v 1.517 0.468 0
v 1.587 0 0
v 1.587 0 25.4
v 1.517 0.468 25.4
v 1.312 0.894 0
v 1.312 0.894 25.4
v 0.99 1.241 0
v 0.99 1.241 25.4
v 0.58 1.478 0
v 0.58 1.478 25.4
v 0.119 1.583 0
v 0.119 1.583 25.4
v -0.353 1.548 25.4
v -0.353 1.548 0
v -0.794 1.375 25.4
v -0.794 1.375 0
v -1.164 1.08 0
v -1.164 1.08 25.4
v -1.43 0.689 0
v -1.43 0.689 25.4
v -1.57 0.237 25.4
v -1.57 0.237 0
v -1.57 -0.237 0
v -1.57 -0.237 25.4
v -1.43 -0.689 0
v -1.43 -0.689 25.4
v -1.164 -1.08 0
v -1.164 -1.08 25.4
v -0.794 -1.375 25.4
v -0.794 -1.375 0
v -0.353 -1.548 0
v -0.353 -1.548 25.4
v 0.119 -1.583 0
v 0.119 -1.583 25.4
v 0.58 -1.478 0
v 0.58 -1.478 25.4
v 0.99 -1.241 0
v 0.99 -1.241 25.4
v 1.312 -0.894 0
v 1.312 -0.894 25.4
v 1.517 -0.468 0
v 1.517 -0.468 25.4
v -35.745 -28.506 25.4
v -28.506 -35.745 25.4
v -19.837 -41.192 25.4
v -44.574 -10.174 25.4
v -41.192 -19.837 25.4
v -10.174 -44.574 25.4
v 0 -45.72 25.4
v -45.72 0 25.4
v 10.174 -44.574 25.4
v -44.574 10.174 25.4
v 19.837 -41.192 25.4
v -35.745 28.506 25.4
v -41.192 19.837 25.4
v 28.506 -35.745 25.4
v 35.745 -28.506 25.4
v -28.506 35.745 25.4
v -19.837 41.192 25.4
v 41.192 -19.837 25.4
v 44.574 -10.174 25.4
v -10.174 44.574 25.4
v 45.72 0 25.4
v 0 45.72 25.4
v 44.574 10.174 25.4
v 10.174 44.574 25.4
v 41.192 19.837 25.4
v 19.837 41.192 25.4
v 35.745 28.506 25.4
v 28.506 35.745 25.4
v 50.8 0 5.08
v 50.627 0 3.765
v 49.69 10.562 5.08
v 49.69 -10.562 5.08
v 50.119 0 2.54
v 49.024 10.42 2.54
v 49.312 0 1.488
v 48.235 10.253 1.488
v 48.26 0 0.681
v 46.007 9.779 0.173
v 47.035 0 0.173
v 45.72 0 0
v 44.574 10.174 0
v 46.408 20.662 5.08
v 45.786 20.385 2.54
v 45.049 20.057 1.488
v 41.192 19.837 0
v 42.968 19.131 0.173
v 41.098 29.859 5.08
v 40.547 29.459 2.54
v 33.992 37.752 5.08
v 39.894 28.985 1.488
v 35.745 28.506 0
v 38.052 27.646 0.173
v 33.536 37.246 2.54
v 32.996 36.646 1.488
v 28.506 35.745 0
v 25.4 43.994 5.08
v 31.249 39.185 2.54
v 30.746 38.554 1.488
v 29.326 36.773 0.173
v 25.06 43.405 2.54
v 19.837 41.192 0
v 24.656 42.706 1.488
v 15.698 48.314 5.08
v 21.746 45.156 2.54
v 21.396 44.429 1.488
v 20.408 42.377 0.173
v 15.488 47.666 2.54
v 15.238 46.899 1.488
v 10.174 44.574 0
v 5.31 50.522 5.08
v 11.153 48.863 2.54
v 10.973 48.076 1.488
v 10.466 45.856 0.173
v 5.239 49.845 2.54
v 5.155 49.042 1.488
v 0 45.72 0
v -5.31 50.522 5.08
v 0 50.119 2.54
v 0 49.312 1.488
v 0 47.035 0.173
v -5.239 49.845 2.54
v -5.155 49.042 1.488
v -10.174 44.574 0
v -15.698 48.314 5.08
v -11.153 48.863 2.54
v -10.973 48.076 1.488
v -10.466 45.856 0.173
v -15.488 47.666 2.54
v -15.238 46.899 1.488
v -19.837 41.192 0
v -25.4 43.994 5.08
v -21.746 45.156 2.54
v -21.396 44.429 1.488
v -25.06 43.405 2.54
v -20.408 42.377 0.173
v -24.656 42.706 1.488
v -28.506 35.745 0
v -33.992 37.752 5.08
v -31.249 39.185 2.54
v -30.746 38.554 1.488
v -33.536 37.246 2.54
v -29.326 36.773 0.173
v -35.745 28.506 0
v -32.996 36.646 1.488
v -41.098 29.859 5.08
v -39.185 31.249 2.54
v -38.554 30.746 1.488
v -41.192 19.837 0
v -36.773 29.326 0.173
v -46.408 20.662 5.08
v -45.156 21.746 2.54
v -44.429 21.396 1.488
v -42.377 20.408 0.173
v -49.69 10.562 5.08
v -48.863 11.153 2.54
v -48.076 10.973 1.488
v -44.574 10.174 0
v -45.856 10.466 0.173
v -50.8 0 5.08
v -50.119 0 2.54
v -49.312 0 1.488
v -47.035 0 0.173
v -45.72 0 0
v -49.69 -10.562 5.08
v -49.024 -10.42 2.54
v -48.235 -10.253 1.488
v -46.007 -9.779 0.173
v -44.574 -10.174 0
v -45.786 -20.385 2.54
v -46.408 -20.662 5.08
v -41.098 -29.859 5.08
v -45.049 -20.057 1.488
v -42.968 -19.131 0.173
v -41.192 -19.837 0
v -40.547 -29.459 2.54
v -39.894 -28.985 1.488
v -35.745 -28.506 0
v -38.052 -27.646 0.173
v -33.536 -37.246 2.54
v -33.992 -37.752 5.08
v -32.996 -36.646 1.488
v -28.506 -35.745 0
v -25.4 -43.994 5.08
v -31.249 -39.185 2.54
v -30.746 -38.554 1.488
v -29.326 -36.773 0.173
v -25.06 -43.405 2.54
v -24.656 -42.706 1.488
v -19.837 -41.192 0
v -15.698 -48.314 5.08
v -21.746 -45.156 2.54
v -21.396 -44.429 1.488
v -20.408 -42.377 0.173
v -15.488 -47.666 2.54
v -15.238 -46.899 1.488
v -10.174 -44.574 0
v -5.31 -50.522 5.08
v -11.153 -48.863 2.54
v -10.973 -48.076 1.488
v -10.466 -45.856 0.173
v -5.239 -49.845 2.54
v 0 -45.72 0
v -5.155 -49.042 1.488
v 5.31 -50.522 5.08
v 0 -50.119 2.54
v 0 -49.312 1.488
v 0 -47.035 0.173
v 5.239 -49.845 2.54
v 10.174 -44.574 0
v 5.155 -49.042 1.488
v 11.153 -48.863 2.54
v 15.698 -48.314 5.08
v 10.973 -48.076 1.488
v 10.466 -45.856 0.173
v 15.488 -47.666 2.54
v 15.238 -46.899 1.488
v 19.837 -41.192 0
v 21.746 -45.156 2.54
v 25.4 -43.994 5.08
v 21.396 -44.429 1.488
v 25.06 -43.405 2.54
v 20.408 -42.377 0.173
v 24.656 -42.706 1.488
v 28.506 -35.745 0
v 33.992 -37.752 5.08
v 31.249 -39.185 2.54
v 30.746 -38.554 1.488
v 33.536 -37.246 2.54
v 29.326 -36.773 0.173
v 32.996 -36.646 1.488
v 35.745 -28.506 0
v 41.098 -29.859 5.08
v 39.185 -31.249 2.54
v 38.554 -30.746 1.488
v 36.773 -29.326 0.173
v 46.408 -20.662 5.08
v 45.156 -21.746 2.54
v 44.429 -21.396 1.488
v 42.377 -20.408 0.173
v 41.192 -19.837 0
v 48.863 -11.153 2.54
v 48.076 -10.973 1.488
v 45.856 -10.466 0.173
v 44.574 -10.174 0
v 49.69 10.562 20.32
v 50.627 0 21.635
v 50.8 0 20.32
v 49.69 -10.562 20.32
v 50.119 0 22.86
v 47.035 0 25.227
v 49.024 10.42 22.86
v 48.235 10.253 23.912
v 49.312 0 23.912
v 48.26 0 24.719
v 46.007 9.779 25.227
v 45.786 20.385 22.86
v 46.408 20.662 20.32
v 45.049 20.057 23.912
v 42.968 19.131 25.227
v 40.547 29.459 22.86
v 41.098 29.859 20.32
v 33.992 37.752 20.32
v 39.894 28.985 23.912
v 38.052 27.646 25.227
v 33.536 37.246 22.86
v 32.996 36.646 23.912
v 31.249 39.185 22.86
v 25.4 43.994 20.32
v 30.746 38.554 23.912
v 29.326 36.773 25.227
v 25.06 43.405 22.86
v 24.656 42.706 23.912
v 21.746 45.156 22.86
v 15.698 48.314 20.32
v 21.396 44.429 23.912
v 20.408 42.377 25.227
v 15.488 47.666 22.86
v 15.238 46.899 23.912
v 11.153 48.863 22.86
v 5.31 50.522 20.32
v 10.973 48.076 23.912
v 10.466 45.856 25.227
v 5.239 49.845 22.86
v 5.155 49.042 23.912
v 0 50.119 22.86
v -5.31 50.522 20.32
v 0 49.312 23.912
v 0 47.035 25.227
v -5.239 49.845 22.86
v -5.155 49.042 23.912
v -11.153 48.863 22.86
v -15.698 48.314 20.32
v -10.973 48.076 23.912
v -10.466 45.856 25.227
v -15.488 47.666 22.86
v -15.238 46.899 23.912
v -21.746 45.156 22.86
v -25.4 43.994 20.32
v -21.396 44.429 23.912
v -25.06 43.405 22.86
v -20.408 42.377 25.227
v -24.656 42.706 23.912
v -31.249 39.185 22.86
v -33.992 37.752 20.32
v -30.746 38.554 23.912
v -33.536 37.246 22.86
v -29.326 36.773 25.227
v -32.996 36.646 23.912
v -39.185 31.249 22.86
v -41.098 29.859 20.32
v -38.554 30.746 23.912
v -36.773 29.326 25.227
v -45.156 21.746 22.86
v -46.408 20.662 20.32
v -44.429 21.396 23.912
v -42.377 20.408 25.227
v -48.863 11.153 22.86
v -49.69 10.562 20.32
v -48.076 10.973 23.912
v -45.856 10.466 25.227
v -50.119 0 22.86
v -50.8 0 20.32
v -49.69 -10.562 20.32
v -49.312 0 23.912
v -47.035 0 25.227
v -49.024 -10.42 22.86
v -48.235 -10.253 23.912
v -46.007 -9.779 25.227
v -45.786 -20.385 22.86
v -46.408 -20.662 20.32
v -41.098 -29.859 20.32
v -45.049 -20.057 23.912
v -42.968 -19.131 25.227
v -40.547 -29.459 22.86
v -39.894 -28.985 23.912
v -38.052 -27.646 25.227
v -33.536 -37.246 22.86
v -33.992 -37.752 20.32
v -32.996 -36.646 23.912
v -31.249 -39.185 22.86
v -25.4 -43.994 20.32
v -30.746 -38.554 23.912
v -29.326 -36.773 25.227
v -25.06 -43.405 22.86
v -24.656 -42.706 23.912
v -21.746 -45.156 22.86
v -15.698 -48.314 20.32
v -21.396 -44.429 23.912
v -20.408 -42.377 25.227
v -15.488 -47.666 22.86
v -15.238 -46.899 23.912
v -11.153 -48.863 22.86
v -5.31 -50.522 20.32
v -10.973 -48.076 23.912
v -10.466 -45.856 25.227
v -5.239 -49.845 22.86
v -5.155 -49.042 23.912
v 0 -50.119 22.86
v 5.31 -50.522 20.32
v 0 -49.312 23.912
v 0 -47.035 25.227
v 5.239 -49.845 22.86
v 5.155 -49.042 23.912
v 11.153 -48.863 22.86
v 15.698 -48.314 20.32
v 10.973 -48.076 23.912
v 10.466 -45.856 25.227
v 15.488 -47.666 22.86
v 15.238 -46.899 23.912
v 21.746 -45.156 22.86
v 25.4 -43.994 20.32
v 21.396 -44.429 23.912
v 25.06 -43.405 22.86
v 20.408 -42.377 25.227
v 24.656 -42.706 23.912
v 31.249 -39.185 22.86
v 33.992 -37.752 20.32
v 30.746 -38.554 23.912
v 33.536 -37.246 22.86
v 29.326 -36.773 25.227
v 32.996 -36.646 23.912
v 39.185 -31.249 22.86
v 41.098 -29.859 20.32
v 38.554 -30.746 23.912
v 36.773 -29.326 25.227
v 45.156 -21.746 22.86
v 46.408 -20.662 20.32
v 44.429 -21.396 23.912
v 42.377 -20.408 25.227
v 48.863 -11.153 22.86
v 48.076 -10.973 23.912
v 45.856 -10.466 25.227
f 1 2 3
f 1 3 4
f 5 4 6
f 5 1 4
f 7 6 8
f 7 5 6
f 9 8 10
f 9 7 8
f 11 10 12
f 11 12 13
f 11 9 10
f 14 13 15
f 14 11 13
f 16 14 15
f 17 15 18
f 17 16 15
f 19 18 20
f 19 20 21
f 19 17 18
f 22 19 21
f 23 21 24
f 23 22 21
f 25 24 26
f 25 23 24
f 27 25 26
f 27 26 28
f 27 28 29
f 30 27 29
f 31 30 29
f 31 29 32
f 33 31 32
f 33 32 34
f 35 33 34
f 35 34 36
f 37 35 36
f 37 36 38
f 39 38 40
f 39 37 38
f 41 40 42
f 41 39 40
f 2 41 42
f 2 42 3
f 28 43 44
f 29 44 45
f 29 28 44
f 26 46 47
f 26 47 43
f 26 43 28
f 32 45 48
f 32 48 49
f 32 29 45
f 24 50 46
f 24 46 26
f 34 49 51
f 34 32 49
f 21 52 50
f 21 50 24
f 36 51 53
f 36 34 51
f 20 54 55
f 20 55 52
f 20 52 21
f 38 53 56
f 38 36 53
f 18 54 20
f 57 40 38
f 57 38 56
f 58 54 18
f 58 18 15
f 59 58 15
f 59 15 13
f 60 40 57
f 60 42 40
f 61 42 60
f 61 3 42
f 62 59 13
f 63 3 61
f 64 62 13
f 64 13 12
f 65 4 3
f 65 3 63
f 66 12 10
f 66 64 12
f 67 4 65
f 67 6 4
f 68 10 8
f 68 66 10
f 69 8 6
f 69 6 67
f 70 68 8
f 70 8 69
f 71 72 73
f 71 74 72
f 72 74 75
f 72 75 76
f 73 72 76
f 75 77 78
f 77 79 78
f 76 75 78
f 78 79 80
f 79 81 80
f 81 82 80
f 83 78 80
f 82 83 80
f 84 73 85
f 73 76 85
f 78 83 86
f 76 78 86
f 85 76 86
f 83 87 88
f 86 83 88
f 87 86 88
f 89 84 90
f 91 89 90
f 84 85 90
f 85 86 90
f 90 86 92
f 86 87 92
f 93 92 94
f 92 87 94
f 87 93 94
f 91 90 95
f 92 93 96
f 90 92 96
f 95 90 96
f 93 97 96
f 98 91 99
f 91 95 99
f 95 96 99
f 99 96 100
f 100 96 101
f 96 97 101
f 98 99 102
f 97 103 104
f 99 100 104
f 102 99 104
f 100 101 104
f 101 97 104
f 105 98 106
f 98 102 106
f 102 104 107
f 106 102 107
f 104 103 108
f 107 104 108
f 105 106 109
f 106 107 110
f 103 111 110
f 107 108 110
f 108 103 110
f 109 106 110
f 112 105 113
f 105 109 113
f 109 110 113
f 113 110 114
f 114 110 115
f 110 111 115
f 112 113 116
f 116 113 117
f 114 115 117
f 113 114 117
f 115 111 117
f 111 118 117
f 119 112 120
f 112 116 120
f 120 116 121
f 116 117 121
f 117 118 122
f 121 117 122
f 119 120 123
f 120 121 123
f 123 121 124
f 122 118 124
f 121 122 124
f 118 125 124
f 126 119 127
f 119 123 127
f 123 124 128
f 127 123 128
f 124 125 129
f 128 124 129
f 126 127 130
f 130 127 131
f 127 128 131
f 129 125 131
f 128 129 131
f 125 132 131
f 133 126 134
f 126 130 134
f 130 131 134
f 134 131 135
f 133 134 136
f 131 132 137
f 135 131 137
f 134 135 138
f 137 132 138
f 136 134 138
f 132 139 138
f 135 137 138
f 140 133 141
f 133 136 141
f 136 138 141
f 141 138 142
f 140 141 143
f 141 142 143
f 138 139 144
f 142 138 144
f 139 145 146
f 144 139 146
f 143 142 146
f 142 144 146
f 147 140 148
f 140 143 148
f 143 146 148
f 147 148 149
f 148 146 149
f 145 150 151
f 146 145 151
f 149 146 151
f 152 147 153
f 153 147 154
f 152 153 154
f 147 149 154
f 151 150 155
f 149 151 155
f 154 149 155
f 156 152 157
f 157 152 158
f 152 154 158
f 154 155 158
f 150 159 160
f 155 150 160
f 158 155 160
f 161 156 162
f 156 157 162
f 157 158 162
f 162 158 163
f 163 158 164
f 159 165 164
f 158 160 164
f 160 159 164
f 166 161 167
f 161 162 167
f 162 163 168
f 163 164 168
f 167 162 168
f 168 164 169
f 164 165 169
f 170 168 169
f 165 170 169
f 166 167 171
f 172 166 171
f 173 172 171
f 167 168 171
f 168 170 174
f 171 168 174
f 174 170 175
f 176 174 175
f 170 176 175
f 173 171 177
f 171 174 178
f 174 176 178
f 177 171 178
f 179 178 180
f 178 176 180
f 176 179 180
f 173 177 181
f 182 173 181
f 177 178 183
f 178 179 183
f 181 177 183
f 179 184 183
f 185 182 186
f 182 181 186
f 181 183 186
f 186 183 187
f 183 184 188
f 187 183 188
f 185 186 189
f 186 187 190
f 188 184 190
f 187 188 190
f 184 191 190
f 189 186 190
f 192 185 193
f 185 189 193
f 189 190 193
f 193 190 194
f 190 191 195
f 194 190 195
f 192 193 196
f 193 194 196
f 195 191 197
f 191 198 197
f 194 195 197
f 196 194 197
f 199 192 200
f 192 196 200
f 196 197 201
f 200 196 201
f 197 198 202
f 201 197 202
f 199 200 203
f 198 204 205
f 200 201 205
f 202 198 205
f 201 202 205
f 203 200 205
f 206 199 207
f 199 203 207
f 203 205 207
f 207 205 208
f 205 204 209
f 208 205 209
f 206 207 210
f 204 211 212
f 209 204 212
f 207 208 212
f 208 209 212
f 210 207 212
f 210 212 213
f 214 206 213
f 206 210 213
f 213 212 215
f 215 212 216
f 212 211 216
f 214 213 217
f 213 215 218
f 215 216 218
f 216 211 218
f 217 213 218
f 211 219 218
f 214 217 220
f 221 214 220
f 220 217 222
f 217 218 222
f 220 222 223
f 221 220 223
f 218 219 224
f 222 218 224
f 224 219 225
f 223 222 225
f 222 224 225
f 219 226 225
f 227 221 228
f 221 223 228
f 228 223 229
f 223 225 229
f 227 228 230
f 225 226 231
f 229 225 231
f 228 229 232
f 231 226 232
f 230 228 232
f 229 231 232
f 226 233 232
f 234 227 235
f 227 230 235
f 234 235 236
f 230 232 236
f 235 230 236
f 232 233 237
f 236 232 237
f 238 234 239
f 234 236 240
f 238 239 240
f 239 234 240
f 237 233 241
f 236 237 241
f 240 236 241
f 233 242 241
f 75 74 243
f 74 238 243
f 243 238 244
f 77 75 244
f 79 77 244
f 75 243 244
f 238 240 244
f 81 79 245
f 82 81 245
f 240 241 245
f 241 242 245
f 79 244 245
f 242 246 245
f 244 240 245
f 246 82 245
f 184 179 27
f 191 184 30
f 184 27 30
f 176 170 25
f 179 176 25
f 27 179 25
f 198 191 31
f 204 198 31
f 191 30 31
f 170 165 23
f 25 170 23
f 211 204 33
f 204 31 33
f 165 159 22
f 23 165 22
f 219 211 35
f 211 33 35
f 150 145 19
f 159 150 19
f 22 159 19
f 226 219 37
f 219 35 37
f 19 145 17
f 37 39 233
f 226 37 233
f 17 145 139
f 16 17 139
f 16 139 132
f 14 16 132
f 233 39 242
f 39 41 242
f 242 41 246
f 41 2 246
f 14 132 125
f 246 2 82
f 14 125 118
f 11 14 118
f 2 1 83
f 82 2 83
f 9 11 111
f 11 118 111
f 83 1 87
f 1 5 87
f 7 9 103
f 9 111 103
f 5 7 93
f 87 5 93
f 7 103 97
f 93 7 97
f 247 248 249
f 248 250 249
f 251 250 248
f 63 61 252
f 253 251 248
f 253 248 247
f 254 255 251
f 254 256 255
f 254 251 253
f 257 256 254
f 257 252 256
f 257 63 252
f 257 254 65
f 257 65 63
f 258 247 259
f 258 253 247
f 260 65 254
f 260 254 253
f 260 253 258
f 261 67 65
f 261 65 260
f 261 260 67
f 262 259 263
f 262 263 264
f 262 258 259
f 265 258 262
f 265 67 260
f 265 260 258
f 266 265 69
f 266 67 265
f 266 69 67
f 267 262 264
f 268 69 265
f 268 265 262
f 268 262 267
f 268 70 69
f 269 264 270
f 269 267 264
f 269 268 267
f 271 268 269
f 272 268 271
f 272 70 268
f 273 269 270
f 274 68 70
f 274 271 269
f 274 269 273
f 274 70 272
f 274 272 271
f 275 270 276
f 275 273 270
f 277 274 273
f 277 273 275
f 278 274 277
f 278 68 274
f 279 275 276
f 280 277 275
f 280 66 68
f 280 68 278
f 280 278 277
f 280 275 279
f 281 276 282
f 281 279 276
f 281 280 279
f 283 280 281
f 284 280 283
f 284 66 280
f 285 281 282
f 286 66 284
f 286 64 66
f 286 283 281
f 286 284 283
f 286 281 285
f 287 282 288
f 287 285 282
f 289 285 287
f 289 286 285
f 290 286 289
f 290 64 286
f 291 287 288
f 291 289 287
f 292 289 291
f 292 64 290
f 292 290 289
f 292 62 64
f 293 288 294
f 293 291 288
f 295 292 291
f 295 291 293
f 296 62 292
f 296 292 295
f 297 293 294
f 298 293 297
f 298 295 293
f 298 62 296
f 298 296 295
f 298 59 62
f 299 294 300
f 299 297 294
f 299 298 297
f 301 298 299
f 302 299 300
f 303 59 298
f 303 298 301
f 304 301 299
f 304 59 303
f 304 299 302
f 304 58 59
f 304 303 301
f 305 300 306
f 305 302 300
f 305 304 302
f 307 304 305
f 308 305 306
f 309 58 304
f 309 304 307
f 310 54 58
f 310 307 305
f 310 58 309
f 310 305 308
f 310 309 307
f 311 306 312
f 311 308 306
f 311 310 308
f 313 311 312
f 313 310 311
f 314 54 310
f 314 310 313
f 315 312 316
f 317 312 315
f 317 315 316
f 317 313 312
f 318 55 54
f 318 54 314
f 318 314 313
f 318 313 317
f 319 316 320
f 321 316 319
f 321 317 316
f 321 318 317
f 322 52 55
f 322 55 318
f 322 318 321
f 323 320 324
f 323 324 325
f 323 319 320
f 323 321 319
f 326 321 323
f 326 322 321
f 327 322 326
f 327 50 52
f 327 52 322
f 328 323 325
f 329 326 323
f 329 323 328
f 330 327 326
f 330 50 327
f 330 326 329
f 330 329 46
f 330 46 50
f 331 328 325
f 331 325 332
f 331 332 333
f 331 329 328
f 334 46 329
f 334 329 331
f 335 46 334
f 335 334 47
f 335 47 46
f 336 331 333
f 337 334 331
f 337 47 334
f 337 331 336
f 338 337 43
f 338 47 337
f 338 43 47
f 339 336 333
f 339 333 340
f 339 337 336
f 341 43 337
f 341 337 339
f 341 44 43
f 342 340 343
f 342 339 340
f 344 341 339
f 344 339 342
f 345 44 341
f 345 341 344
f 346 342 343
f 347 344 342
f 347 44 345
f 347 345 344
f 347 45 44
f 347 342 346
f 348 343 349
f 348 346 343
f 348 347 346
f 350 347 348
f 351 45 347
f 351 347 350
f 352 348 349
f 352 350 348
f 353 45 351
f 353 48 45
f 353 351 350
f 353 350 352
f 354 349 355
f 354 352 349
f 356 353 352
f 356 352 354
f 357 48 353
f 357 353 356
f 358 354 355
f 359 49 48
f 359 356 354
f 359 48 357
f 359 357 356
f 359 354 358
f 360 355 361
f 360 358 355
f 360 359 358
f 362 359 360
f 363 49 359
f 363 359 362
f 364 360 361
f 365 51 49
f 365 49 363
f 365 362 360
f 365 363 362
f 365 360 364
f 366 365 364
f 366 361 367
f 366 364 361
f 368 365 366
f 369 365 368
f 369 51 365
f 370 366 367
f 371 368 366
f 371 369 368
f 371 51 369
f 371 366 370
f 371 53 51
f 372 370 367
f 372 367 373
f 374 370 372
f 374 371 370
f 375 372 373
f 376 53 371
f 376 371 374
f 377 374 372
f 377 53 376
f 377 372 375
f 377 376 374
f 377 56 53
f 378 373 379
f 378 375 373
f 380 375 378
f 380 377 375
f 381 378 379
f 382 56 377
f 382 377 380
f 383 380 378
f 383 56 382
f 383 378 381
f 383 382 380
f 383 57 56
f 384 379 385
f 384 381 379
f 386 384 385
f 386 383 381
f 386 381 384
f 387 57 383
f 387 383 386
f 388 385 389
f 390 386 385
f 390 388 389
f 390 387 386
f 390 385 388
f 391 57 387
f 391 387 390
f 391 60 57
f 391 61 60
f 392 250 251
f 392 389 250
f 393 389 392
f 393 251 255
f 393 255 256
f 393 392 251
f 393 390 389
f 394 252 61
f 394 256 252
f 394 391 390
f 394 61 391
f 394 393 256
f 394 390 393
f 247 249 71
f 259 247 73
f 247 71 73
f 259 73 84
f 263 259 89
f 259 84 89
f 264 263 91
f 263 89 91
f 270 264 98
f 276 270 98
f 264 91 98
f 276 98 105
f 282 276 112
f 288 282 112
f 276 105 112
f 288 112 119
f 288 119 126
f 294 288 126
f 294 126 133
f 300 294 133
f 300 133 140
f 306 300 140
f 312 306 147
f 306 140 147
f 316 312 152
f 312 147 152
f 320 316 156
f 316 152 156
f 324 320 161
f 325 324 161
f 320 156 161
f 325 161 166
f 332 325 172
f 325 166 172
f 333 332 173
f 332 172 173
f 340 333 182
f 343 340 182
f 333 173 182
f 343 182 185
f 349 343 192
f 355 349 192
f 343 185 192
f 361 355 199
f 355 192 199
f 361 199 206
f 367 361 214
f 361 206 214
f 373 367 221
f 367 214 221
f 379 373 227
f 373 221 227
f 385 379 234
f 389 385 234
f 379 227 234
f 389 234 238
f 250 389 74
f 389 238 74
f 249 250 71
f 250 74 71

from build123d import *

# Parameters (mm, degrees)
F0_R     = 50.8
F0_R_2   = 1.5875
F1_DEPTH = 25.4
F2_DEPTH = 25.4
F3_R     = 5.08


with BuildPart() as f1:
    # F0 (on Top) → F1 (new body)
    with BuildSketch(Plane.XY):
        Circle(F0_R)
        Circle(F0_R_2, mode=Mode.SUBTRACT)
    extrude(amount=F1_DEPTH)

    # F0 (on Top) → F2 (join)
    with BuildSketch(Plane.XY):
        Circle(F0_R)
        Circle(F0_R_2, mode=Mode.SUBTRACT)
    extrude(amount=F2_DEPTH)

    # F3
    f3_edges = [f1.edges().sort_by_distance(p)[0] for p in [
        (-50.8, 0, 0),
        (50.8, 0, 12.7),
        (-50.8, 0, 25.4),
    ]]
    fillet(f3_edges, radius=F3_R)


solid = f1.part
